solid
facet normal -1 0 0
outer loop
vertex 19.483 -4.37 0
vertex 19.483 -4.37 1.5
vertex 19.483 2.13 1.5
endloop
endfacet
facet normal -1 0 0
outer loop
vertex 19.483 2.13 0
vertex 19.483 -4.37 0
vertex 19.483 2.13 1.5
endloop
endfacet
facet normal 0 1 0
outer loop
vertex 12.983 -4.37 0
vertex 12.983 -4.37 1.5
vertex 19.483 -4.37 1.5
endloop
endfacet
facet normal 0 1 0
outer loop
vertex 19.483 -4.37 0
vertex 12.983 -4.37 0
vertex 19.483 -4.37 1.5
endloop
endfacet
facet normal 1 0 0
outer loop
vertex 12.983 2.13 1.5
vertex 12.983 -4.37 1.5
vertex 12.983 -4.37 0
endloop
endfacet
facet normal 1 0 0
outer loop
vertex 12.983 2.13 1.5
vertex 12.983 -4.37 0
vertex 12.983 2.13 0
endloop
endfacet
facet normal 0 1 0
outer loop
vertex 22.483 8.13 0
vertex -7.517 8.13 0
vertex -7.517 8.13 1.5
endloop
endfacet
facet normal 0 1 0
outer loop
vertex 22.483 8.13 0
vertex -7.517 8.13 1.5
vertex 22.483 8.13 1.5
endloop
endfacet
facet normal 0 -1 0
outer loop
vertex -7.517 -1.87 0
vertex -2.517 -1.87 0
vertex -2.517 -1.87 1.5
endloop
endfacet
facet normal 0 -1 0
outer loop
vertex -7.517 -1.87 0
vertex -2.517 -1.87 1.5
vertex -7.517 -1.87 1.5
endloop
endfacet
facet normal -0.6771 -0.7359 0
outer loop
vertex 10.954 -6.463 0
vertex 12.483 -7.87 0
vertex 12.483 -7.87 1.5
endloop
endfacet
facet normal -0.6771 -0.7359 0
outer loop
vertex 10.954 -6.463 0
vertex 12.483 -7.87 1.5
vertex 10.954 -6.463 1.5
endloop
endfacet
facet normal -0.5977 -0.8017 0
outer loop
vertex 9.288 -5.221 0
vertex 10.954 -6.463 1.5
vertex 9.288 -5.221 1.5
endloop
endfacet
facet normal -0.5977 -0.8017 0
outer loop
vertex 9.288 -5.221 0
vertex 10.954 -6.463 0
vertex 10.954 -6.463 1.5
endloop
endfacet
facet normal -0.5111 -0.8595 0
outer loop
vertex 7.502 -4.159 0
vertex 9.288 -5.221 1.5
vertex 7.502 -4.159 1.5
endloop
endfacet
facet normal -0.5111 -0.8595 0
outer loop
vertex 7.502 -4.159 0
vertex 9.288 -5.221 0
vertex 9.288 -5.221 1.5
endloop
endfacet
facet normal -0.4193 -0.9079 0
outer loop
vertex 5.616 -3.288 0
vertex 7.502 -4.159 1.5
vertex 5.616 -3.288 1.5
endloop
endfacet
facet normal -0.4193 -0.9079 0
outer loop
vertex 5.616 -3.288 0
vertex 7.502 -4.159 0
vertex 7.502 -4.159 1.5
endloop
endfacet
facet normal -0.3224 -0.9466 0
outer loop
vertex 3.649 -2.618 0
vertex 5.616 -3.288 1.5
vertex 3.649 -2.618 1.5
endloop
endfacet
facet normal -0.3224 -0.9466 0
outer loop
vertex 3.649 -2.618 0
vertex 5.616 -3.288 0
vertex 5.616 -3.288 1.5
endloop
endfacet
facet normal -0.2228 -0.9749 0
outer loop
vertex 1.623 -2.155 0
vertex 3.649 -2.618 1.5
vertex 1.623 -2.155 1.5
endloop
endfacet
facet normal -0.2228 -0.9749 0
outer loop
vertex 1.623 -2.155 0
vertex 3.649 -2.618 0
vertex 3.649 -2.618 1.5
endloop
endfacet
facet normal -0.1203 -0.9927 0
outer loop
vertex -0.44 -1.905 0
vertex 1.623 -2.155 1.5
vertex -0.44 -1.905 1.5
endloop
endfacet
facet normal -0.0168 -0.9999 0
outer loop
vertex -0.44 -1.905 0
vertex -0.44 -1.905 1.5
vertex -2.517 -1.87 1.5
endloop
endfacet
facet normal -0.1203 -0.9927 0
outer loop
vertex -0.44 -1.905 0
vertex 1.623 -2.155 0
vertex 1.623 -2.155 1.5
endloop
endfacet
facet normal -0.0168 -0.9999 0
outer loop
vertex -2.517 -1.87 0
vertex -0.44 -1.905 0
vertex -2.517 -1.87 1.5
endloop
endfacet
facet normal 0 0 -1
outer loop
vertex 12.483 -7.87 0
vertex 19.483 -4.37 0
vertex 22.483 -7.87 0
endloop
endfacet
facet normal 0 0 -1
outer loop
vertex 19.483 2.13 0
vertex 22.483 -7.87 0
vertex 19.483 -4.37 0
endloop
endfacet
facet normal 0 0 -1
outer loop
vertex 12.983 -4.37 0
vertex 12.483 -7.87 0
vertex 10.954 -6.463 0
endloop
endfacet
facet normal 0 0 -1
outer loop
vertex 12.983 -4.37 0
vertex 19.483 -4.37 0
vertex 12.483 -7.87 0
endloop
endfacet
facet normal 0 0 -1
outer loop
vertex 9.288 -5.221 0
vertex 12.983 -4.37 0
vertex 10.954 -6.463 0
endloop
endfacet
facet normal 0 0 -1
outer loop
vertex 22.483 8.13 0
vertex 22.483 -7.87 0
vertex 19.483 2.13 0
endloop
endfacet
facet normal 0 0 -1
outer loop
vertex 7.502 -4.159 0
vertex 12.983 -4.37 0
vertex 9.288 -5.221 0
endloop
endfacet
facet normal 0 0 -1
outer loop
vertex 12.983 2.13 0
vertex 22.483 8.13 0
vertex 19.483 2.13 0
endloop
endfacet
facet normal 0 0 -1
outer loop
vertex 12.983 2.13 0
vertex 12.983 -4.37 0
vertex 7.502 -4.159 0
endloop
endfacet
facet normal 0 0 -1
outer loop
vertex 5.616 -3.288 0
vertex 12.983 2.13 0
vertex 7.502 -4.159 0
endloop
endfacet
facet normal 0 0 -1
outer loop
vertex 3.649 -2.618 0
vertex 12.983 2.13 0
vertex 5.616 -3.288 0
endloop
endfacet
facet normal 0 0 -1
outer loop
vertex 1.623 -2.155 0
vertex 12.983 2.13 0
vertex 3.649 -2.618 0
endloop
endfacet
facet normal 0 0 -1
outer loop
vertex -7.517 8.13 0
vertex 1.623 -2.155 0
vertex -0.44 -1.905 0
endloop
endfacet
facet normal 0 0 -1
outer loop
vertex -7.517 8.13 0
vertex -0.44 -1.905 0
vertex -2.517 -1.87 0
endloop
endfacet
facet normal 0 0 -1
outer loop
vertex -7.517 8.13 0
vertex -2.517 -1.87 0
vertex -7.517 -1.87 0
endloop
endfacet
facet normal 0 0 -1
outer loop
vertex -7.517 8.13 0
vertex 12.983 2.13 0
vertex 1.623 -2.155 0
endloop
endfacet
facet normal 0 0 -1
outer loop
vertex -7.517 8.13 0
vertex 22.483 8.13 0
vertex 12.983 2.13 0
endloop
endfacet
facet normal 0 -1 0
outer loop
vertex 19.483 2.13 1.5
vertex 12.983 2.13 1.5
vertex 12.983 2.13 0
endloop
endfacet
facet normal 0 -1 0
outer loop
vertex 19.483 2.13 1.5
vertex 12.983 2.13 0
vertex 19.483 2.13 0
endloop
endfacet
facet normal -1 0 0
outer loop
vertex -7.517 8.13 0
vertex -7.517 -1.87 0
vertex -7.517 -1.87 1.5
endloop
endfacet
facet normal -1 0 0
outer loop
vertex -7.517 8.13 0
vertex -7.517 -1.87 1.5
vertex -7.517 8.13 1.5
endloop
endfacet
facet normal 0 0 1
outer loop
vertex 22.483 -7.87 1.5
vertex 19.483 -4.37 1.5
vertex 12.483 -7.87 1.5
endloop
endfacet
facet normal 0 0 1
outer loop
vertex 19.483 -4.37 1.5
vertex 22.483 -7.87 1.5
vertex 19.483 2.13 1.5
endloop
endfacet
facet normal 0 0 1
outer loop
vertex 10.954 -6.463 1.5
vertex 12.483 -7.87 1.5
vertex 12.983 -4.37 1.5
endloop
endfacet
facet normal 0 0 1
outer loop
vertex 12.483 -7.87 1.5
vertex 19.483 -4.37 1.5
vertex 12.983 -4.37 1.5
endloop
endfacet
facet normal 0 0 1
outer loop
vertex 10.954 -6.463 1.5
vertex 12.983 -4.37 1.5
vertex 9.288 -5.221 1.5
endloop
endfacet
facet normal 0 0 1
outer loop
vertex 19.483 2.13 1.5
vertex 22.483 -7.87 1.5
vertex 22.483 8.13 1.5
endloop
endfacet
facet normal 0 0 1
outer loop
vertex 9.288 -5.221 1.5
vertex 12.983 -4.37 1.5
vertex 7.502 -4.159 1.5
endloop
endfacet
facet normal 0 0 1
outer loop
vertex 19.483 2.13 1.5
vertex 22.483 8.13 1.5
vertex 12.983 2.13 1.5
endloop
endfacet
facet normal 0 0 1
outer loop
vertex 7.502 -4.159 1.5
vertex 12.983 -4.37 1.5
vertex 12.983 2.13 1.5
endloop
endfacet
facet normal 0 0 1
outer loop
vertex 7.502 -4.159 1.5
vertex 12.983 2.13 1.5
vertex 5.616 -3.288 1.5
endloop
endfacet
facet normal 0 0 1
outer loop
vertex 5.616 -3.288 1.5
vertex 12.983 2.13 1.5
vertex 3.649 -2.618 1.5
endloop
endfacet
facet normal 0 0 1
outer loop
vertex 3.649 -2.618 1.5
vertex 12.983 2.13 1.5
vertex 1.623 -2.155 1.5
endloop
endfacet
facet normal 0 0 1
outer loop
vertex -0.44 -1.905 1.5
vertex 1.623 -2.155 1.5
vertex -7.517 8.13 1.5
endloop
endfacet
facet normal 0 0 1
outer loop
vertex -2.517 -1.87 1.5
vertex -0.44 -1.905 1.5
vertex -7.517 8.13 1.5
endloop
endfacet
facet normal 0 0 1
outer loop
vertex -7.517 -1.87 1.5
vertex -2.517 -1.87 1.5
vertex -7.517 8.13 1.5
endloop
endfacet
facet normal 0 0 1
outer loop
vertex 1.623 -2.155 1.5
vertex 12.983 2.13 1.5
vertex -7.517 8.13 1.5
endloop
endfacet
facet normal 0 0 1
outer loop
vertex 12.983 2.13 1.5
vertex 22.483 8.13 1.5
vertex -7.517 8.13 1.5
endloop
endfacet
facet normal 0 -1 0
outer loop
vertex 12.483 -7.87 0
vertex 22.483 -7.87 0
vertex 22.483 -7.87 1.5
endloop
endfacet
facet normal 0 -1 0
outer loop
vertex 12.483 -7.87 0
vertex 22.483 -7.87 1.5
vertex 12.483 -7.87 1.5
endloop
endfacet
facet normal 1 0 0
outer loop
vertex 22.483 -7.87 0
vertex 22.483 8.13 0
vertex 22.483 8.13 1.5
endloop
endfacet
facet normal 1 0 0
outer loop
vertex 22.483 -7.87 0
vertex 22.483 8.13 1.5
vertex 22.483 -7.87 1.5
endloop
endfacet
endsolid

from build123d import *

# Parameters (mm, degrees)
BOSS_EXTRUDE1_DEPTH = 1.5
SKETCH3_W           = 6.5
SKETCH3_H           = 6.5
CUT_EXTRUDE1_DEPTH  = 2


with BuildPart() as part:
    # Sketch2 → Boss-Extrude1 (new body)
    with BuildSketch(Plane.XY):
        with BuildLine():
            Line((-7.517156851, 8.129598801), (22.482843149, 8.129598801))
            Line((22.482843149, 8.129598801), (22.482843149, -7.870401199))
            Line((22.482843149, -7.870401199), (12.482843149, -7.870401199))
            ThreePointArc((12.482843149, -7.870401199), (5.615628068, -3.288438903), (-2.517156851, -1.870401199))
            Line((-2.517156851, -1.870401199), (-7.517156851, -1.870401199))
            Line((-7.517156851, -1.870401199), (-7.517156851, 8.129598801))
        make_face()
    extrude(amount=BOSS_EXTRUDE1_DEPTH)

    # Sketch3 → Cut-Extrude1 (cut)
    with BuildSketch(Plane.XY.offset(1.5)):
        with Locations((16.232843149, -1.120401199)):
            Rectangle(SKETCH3_W, SKETCH3_H)
    extrude(amount=-CUT_EXTRUDE1_DEPTH, mode=Mode.SUBTRACT)


solid = part.part
